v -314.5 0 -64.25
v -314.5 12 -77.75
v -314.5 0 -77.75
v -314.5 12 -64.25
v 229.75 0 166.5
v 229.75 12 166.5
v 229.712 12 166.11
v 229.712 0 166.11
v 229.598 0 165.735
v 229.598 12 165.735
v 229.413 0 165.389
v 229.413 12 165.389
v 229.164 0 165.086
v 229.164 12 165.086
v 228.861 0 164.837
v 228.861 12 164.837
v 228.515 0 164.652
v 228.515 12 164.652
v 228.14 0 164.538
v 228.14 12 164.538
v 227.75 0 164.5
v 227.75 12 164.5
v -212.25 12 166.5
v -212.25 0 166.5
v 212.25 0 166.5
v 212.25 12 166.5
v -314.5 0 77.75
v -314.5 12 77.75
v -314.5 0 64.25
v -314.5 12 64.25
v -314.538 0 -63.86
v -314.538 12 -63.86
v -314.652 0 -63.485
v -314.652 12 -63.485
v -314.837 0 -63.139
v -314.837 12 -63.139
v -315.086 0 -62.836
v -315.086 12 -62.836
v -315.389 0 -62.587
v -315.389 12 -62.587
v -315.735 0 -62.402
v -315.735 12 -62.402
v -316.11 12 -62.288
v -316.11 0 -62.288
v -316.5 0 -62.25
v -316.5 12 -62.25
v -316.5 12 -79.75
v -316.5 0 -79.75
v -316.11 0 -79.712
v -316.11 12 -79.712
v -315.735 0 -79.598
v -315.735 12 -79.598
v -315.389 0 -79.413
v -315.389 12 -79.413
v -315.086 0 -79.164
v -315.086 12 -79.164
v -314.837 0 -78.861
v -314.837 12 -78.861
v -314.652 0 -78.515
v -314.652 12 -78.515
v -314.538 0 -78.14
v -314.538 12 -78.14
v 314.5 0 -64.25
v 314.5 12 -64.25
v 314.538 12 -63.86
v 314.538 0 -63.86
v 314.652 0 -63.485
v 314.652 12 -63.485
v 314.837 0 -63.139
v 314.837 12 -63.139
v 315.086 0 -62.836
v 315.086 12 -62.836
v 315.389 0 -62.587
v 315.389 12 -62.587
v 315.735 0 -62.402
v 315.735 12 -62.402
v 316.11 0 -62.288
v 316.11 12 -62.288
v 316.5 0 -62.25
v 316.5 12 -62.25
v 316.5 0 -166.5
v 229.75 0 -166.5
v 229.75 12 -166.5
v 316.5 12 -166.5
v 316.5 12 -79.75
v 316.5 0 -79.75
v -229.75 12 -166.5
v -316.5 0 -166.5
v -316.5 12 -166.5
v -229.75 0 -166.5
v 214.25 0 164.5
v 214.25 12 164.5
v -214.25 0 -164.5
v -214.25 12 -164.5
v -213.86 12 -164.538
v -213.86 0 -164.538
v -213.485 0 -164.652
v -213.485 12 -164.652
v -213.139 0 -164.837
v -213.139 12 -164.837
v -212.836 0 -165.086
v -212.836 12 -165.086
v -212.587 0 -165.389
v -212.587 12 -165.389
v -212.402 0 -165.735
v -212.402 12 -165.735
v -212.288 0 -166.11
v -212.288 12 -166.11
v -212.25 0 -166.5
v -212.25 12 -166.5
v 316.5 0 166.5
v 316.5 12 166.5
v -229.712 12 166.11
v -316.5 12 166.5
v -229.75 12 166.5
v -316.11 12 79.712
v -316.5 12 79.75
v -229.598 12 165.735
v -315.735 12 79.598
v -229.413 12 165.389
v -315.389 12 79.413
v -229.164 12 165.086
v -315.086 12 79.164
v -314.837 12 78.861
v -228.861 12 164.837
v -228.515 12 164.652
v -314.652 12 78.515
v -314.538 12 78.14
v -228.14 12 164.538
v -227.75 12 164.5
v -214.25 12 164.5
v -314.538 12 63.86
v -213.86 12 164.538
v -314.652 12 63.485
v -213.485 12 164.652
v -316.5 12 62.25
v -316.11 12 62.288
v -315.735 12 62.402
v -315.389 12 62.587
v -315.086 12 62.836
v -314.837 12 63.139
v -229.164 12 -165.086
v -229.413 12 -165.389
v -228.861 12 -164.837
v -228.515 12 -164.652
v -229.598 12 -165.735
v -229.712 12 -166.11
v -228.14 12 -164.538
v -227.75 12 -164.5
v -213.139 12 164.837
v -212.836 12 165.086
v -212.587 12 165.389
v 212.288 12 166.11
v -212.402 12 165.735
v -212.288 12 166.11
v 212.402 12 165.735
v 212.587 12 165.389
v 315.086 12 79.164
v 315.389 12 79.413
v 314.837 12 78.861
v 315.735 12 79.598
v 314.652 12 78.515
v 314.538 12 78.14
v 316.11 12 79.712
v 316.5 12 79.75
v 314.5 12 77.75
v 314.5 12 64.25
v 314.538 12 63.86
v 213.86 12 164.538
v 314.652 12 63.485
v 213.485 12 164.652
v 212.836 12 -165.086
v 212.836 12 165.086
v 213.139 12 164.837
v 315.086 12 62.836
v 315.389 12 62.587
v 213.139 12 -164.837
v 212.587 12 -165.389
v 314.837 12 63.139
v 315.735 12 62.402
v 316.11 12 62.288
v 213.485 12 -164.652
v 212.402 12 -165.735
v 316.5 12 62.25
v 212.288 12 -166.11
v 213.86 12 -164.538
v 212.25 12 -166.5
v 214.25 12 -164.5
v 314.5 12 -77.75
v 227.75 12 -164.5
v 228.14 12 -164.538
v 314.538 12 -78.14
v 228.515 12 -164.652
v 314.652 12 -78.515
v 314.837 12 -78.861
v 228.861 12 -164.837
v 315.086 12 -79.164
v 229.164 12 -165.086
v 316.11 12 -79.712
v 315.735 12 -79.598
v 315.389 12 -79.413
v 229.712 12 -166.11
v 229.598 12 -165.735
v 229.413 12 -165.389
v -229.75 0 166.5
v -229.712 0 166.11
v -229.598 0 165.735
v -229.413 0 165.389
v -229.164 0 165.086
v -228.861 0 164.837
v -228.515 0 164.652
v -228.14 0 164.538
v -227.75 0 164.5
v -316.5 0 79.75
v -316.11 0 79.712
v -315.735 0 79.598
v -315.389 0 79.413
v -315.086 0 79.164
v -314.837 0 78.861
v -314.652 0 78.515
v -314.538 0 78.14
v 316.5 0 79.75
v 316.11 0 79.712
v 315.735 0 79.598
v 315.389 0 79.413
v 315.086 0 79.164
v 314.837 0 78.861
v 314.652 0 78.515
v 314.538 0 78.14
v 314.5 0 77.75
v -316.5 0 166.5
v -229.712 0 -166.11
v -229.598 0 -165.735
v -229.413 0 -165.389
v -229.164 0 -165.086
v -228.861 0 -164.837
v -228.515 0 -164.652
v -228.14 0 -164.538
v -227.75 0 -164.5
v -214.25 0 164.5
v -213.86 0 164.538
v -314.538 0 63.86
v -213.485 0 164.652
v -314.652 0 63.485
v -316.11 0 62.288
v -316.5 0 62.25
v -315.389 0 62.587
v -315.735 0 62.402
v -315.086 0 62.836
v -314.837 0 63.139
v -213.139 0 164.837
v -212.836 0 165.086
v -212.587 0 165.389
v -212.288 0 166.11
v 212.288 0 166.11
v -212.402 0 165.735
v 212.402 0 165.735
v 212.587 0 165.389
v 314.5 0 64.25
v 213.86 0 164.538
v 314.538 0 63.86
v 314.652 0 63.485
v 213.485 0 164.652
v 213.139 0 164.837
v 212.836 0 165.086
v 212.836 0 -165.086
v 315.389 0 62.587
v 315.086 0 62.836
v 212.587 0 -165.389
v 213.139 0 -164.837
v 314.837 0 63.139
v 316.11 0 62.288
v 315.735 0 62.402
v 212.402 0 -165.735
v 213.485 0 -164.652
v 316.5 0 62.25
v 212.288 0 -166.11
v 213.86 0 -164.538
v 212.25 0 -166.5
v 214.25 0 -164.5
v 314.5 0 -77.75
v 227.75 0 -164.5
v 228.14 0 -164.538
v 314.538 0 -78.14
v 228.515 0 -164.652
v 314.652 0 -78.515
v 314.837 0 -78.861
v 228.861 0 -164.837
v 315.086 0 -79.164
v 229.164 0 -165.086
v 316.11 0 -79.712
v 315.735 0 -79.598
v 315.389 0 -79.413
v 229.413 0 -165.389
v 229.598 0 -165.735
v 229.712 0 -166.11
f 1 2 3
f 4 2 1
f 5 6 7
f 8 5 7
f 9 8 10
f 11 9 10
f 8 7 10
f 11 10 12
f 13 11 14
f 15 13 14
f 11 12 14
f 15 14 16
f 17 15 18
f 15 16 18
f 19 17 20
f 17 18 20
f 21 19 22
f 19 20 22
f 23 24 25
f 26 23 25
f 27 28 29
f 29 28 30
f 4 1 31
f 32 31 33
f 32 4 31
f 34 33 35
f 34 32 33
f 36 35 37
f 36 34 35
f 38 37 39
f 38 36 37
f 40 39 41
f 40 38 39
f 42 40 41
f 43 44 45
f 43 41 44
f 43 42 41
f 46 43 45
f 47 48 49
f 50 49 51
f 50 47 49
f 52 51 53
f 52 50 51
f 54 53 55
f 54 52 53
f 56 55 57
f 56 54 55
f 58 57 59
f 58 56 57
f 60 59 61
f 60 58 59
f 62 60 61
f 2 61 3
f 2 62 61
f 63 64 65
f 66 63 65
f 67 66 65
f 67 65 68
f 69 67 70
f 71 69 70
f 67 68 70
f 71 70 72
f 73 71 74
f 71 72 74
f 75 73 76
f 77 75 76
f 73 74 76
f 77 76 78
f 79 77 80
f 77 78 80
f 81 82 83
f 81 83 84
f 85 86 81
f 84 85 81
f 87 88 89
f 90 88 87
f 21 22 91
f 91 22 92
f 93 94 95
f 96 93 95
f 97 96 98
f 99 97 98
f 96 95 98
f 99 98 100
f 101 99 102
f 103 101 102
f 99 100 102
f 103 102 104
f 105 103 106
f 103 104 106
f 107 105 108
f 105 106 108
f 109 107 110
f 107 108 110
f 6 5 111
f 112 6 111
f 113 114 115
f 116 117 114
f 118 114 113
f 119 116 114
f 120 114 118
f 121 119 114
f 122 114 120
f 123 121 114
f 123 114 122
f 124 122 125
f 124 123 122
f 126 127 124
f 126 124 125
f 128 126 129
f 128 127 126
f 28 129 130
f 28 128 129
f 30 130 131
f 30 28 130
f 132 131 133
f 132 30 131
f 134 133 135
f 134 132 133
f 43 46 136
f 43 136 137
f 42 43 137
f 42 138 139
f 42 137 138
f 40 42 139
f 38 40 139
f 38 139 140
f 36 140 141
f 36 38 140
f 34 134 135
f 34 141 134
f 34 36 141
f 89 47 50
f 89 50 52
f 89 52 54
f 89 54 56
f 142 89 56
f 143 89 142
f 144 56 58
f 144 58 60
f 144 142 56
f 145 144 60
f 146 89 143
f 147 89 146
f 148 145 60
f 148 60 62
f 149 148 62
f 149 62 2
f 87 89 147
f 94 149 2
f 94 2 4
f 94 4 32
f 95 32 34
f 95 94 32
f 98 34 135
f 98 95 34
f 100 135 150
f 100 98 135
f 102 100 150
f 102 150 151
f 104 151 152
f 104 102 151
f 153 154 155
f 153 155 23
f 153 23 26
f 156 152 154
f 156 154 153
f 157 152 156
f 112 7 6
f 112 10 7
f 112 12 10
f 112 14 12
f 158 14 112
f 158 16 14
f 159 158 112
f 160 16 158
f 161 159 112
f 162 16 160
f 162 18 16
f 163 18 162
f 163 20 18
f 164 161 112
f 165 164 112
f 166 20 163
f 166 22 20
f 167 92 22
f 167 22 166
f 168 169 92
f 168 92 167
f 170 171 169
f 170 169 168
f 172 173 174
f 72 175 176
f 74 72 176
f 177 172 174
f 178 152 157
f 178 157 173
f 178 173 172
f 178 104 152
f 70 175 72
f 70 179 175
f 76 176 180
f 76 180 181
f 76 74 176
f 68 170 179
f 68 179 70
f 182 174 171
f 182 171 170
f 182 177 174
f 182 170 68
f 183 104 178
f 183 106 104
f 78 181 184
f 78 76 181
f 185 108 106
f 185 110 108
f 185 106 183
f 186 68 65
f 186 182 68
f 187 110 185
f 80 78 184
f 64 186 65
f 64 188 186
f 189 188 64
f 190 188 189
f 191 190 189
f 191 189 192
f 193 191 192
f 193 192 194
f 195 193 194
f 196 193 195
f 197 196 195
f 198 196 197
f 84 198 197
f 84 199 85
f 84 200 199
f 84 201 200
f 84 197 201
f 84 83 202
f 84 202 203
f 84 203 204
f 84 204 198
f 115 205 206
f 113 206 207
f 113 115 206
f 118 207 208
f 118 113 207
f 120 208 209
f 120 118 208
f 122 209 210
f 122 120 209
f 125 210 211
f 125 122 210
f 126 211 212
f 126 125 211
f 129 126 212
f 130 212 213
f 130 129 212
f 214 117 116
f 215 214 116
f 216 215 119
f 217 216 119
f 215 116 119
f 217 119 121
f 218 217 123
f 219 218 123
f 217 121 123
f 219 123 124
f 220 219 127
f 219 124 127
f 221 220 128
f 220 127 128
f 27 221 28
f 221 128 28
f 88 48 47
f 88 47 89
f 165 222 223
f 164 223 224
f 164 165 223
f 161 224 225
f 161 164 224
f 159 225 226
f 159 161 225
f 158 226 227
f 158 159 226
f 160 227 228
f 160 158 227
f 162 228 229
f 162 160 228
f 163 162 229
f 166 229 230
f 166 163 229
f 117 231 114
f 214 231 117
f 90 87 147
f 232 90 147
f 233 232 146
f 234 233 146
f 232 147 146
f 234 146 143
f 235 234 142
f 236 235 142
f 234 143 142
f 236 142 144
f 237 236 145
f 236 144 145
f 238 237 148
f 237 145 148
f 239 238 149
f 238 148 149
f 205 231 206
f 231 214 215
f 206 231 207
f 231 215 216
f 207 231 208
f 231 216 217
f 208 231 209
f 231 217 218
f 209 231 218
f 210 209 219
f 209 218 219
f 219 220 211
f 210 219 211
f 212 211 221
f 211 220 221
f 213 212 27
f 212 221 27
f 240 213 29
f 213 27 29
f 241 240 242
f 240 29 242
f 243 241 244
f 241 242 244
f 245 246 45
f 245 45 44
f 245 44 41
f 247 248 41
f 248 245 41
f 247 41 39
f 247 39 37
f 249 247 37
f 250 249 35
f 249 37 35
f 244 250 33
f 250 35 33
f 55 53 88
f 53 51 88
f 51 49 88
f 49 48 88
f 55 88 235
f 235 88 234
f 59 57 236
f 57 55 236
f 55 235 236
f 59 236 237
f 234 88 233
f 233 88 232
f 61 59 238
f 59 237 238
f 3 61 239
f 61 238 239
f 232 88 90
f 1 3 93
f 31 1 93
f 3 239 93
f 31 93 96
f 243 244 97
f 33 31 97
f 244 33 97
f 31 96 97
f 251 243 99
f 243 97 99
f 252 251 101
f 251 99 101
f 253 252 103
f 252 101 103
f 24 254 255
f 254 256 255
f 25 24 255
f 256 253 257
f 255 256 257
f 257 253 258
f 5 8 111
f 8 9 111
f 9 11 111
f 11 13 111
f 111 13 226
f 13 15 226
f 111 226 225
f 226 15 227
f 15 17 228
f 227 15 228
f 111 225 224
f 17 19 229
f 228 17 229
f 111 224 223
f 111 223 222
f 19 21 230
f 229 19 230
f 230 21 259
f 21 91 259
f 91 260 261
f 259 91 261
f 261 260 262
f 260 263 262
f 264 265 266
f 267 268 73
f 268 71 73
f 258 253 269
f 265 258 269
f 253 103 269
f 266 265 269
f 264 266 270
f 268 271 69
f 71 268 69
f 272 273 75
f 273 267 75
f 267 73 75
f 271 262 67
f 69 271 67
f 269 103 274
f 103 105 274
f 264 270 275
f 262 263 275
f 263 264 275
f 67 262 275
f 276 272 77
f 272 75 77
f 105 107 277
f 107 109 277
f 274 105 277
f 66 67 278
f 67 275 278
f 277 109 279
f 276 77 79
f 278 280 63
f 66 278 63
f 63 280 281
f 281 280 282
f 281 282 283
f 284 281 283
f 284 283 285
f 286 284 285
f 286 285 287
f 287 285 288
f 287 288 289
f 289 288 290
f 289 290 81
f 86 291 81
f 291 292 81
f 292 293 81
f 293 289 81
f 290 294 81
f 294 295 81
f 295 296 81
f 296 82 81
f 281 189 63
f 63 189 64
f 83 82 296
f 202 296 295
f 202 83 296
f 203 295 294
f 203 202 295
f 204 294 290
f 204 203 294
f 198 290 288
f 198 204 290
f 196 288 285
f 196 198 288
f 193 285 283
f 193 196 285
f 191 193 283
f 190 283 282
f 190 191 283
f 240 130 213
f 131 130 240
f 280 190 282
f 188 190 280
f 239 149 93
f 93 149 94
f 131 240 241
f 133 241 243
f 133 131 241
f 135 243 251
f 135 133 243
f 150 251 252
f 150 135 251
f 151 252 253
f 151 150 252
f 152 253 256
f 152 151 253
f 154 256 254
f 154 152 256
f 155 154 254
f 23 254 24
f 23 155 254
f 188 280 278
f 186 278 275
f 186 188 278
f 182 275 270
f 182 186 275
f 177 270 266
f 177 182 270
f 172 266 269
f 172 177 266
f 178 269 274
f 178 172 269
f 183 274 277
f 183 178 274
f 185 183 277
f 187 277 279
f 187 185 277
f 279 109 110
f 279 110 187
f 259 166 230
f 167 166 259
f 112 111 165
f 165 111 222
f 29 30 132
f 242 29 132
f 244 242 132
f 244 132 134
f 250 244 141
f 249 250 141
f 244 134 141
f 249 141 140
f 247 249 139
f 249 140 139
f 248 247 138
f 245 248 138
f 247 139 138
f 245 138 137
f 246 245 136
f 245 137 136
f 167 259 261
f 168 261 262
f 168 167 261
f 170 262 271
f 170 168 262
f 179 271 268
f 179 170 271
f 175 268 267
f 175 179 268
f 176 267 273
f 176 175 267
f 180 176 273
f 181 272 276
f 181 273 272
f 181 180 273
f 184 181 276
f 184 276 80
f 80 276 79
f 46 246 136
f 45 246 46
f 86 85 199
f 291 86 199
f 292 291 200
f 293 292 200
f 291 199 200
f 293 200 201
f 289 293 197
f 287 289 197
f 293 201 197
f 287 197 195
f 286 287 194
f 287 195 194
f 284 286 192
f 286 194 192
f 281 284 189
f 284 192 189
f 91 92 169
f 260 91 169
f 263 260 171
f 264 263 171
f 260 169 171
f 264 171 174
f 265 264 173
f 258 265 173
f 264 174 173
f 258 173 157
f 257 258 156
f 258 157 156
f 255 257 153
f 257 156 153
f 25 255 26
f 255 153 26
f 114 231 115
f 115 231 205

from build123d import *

# Parameters (mm, degrees)
SKETCH1_W           = 633
SKETCH1_H           = 333
BOSS_EXTRUDE1_DEPTH = 12
CUT_EXTRUDE1_DEPTH  = 13


with BuildPart() as part:
    # Sketch1 → Boss-Extrude1 (new body)
    with BuildSketch(Plane(origin=(0, 0, 0), x_dir=(1, 0, 0), z_dir=(0, 1, 0))):
        Rectangle(SKETCH1_W, SKETCH1_H)
    extrude(amount=BOSS_EXTRUDE1_DEPTH)

    # Sketch2 → Cut-Extrude1 (cut, through all)
    with BuildSketch(Plane(origin=(0, 12, 0), x_dir=(1, 0, 0), z_dir=(0, 1, 0))):
        with BuildLine():
            Line((-227.75, -164.5), (-214.25, -164.5))
            ThreePointArc((-214.25, -164.5), (-212.835786438, -165.085786438), (-212.25, -166.5))
            Line((-212.25, -166.5), (-212.25, -168.5))
            Line((-212.25, -168.5), (-229.75, -168.5))
            Line((-229.75, -168.5), (-229.75, -166.5))
            ThreePointArc((-229.75, -166.5), (-229.164213562, -165.085786438), (-227.75, -164.5))
        make_face()
        with BuildLine():
            Line((316.5, -62.25), (318.5, -62.25))
            Line((318.5, -62.25), (318.5, -79.75))
            Line((318.5, -79.75), (316.5, -79.75))
            ThreePointArc((316.5, -79.75), (315.085786438, -79.164213562), (314.5, -77.75))
            Line((314.5, -77.75), (314.5, -64.25))
            ThreePointArc((314.5, -64.25), (315.085786438, -62.835786438), (316.5, -62.25))
        make_face()
        with BuildLine():
            Line((212.25, -166.5), (212.25, -168.5))
            Line((212.25, -168.5), (229.75, -168.5))
            Line((229.75, -168.5), (229.75, -166.5))
            ThreePointArc((229.75, -166.5), (229.164213562, -165.085786438), (227.75, -164.5))
            Line((227.75, -164.5), (214.25, -164.5))
            ThreePointArc((214.25, -164.5), (212.835786438, -165.085786438), (212.25, -166.5))
        make_face()
        with BuildLine():
            Line((318.5, 62.25), (318.5, 79.75))
            Line((318.5, 79.75), (316.5, 79.75))
            ThreePointArc((316.5, 79.75), (315.085786438, 79.164213562), (314.5, 77.75))
            Line((314.5, 77.75), (314.5, 64.25))
            ThreePointArc((314.5, 64.25), (315.085786438, 62.835786438), (316.5, 62.25))
            Line((316.5, 62.25), (318.5, 62.25))
        make_face()
        with BuildLine():
            Line((-316.5, 62.25), (-318.5, 62.25))
            Line((-318.5, 62.25), (-318.5, 79.75))
            Line((-318.5, 79.75), (-316.5, 79.75))
            ThreePointArc((-316.5, 79.75), (-315.085786438, 79.164213562), (-314.5, 77.75))
            Line((-314.5, 77.75), (-314.5, 64.25))
            ThreePointArc((-314.5, 64.25), (-315.085786438, 62.835786438), (-316.5, 62.25))
        make_face()
        with BuildLine():
            Line((-318.5, -62.25), (-318.5, -79.75))
            Line((-318.5, -79.75), (-316.5, -79.75))
            ThreePointArc((-316.5, -79.75), (-315.085786438, -79.164213562), (-314.5, -77.75))
            Line((-314.5, -77.75), (-314.5, -64.25))
            ThreePointArc((-314.5, -64.25), (-315.085786438, -62.835786438), (-316.5, -62.25))
            Line((-316.5, -62.25), (-318.5, -62.25))
        make_face()
        with BuildLine():
            Line((227.75, 164.5), (214.25, 164.5))
            ThreePointArc((214.25, 164.5), (212.835786438, 165.085786438), (212.25, 166.5))
            Line((212.25, 166.5), (212.25, 168.5))
            Line((212.25, 168.5), (229.75, 168.5))
            Line((229.75, 168.5), (229.75, 166.5))
            ThreePointArc((229.75, 166.5), (229.164213562, 165.085786438), (227.75, 164.5))
        make_face()
        with BuildLine():
            Line((-212.25, 166.5), (-212.25, 168.5))
            Line((-212.25, 168.5), (-229.75, 168.5))
            Line((-229.75, 168.5), (-229.75, 166.5))
            ThreePointArc((-229.75, 166.5), (-229.164213562, 165.085786438), (-227.75, 164.5))
            Line((-227.75, 164.5), (-214.25, 164.5))
            ThreePointArc((-214.25, 164.5), (-212.835786438, 165.085786438), (-212.25, 166.5))
        make_face()
    extrude(amount=-CUT_EXTRUDE1_DEPTH, mode=Mode.SUBTRACT)


solid = part.part
